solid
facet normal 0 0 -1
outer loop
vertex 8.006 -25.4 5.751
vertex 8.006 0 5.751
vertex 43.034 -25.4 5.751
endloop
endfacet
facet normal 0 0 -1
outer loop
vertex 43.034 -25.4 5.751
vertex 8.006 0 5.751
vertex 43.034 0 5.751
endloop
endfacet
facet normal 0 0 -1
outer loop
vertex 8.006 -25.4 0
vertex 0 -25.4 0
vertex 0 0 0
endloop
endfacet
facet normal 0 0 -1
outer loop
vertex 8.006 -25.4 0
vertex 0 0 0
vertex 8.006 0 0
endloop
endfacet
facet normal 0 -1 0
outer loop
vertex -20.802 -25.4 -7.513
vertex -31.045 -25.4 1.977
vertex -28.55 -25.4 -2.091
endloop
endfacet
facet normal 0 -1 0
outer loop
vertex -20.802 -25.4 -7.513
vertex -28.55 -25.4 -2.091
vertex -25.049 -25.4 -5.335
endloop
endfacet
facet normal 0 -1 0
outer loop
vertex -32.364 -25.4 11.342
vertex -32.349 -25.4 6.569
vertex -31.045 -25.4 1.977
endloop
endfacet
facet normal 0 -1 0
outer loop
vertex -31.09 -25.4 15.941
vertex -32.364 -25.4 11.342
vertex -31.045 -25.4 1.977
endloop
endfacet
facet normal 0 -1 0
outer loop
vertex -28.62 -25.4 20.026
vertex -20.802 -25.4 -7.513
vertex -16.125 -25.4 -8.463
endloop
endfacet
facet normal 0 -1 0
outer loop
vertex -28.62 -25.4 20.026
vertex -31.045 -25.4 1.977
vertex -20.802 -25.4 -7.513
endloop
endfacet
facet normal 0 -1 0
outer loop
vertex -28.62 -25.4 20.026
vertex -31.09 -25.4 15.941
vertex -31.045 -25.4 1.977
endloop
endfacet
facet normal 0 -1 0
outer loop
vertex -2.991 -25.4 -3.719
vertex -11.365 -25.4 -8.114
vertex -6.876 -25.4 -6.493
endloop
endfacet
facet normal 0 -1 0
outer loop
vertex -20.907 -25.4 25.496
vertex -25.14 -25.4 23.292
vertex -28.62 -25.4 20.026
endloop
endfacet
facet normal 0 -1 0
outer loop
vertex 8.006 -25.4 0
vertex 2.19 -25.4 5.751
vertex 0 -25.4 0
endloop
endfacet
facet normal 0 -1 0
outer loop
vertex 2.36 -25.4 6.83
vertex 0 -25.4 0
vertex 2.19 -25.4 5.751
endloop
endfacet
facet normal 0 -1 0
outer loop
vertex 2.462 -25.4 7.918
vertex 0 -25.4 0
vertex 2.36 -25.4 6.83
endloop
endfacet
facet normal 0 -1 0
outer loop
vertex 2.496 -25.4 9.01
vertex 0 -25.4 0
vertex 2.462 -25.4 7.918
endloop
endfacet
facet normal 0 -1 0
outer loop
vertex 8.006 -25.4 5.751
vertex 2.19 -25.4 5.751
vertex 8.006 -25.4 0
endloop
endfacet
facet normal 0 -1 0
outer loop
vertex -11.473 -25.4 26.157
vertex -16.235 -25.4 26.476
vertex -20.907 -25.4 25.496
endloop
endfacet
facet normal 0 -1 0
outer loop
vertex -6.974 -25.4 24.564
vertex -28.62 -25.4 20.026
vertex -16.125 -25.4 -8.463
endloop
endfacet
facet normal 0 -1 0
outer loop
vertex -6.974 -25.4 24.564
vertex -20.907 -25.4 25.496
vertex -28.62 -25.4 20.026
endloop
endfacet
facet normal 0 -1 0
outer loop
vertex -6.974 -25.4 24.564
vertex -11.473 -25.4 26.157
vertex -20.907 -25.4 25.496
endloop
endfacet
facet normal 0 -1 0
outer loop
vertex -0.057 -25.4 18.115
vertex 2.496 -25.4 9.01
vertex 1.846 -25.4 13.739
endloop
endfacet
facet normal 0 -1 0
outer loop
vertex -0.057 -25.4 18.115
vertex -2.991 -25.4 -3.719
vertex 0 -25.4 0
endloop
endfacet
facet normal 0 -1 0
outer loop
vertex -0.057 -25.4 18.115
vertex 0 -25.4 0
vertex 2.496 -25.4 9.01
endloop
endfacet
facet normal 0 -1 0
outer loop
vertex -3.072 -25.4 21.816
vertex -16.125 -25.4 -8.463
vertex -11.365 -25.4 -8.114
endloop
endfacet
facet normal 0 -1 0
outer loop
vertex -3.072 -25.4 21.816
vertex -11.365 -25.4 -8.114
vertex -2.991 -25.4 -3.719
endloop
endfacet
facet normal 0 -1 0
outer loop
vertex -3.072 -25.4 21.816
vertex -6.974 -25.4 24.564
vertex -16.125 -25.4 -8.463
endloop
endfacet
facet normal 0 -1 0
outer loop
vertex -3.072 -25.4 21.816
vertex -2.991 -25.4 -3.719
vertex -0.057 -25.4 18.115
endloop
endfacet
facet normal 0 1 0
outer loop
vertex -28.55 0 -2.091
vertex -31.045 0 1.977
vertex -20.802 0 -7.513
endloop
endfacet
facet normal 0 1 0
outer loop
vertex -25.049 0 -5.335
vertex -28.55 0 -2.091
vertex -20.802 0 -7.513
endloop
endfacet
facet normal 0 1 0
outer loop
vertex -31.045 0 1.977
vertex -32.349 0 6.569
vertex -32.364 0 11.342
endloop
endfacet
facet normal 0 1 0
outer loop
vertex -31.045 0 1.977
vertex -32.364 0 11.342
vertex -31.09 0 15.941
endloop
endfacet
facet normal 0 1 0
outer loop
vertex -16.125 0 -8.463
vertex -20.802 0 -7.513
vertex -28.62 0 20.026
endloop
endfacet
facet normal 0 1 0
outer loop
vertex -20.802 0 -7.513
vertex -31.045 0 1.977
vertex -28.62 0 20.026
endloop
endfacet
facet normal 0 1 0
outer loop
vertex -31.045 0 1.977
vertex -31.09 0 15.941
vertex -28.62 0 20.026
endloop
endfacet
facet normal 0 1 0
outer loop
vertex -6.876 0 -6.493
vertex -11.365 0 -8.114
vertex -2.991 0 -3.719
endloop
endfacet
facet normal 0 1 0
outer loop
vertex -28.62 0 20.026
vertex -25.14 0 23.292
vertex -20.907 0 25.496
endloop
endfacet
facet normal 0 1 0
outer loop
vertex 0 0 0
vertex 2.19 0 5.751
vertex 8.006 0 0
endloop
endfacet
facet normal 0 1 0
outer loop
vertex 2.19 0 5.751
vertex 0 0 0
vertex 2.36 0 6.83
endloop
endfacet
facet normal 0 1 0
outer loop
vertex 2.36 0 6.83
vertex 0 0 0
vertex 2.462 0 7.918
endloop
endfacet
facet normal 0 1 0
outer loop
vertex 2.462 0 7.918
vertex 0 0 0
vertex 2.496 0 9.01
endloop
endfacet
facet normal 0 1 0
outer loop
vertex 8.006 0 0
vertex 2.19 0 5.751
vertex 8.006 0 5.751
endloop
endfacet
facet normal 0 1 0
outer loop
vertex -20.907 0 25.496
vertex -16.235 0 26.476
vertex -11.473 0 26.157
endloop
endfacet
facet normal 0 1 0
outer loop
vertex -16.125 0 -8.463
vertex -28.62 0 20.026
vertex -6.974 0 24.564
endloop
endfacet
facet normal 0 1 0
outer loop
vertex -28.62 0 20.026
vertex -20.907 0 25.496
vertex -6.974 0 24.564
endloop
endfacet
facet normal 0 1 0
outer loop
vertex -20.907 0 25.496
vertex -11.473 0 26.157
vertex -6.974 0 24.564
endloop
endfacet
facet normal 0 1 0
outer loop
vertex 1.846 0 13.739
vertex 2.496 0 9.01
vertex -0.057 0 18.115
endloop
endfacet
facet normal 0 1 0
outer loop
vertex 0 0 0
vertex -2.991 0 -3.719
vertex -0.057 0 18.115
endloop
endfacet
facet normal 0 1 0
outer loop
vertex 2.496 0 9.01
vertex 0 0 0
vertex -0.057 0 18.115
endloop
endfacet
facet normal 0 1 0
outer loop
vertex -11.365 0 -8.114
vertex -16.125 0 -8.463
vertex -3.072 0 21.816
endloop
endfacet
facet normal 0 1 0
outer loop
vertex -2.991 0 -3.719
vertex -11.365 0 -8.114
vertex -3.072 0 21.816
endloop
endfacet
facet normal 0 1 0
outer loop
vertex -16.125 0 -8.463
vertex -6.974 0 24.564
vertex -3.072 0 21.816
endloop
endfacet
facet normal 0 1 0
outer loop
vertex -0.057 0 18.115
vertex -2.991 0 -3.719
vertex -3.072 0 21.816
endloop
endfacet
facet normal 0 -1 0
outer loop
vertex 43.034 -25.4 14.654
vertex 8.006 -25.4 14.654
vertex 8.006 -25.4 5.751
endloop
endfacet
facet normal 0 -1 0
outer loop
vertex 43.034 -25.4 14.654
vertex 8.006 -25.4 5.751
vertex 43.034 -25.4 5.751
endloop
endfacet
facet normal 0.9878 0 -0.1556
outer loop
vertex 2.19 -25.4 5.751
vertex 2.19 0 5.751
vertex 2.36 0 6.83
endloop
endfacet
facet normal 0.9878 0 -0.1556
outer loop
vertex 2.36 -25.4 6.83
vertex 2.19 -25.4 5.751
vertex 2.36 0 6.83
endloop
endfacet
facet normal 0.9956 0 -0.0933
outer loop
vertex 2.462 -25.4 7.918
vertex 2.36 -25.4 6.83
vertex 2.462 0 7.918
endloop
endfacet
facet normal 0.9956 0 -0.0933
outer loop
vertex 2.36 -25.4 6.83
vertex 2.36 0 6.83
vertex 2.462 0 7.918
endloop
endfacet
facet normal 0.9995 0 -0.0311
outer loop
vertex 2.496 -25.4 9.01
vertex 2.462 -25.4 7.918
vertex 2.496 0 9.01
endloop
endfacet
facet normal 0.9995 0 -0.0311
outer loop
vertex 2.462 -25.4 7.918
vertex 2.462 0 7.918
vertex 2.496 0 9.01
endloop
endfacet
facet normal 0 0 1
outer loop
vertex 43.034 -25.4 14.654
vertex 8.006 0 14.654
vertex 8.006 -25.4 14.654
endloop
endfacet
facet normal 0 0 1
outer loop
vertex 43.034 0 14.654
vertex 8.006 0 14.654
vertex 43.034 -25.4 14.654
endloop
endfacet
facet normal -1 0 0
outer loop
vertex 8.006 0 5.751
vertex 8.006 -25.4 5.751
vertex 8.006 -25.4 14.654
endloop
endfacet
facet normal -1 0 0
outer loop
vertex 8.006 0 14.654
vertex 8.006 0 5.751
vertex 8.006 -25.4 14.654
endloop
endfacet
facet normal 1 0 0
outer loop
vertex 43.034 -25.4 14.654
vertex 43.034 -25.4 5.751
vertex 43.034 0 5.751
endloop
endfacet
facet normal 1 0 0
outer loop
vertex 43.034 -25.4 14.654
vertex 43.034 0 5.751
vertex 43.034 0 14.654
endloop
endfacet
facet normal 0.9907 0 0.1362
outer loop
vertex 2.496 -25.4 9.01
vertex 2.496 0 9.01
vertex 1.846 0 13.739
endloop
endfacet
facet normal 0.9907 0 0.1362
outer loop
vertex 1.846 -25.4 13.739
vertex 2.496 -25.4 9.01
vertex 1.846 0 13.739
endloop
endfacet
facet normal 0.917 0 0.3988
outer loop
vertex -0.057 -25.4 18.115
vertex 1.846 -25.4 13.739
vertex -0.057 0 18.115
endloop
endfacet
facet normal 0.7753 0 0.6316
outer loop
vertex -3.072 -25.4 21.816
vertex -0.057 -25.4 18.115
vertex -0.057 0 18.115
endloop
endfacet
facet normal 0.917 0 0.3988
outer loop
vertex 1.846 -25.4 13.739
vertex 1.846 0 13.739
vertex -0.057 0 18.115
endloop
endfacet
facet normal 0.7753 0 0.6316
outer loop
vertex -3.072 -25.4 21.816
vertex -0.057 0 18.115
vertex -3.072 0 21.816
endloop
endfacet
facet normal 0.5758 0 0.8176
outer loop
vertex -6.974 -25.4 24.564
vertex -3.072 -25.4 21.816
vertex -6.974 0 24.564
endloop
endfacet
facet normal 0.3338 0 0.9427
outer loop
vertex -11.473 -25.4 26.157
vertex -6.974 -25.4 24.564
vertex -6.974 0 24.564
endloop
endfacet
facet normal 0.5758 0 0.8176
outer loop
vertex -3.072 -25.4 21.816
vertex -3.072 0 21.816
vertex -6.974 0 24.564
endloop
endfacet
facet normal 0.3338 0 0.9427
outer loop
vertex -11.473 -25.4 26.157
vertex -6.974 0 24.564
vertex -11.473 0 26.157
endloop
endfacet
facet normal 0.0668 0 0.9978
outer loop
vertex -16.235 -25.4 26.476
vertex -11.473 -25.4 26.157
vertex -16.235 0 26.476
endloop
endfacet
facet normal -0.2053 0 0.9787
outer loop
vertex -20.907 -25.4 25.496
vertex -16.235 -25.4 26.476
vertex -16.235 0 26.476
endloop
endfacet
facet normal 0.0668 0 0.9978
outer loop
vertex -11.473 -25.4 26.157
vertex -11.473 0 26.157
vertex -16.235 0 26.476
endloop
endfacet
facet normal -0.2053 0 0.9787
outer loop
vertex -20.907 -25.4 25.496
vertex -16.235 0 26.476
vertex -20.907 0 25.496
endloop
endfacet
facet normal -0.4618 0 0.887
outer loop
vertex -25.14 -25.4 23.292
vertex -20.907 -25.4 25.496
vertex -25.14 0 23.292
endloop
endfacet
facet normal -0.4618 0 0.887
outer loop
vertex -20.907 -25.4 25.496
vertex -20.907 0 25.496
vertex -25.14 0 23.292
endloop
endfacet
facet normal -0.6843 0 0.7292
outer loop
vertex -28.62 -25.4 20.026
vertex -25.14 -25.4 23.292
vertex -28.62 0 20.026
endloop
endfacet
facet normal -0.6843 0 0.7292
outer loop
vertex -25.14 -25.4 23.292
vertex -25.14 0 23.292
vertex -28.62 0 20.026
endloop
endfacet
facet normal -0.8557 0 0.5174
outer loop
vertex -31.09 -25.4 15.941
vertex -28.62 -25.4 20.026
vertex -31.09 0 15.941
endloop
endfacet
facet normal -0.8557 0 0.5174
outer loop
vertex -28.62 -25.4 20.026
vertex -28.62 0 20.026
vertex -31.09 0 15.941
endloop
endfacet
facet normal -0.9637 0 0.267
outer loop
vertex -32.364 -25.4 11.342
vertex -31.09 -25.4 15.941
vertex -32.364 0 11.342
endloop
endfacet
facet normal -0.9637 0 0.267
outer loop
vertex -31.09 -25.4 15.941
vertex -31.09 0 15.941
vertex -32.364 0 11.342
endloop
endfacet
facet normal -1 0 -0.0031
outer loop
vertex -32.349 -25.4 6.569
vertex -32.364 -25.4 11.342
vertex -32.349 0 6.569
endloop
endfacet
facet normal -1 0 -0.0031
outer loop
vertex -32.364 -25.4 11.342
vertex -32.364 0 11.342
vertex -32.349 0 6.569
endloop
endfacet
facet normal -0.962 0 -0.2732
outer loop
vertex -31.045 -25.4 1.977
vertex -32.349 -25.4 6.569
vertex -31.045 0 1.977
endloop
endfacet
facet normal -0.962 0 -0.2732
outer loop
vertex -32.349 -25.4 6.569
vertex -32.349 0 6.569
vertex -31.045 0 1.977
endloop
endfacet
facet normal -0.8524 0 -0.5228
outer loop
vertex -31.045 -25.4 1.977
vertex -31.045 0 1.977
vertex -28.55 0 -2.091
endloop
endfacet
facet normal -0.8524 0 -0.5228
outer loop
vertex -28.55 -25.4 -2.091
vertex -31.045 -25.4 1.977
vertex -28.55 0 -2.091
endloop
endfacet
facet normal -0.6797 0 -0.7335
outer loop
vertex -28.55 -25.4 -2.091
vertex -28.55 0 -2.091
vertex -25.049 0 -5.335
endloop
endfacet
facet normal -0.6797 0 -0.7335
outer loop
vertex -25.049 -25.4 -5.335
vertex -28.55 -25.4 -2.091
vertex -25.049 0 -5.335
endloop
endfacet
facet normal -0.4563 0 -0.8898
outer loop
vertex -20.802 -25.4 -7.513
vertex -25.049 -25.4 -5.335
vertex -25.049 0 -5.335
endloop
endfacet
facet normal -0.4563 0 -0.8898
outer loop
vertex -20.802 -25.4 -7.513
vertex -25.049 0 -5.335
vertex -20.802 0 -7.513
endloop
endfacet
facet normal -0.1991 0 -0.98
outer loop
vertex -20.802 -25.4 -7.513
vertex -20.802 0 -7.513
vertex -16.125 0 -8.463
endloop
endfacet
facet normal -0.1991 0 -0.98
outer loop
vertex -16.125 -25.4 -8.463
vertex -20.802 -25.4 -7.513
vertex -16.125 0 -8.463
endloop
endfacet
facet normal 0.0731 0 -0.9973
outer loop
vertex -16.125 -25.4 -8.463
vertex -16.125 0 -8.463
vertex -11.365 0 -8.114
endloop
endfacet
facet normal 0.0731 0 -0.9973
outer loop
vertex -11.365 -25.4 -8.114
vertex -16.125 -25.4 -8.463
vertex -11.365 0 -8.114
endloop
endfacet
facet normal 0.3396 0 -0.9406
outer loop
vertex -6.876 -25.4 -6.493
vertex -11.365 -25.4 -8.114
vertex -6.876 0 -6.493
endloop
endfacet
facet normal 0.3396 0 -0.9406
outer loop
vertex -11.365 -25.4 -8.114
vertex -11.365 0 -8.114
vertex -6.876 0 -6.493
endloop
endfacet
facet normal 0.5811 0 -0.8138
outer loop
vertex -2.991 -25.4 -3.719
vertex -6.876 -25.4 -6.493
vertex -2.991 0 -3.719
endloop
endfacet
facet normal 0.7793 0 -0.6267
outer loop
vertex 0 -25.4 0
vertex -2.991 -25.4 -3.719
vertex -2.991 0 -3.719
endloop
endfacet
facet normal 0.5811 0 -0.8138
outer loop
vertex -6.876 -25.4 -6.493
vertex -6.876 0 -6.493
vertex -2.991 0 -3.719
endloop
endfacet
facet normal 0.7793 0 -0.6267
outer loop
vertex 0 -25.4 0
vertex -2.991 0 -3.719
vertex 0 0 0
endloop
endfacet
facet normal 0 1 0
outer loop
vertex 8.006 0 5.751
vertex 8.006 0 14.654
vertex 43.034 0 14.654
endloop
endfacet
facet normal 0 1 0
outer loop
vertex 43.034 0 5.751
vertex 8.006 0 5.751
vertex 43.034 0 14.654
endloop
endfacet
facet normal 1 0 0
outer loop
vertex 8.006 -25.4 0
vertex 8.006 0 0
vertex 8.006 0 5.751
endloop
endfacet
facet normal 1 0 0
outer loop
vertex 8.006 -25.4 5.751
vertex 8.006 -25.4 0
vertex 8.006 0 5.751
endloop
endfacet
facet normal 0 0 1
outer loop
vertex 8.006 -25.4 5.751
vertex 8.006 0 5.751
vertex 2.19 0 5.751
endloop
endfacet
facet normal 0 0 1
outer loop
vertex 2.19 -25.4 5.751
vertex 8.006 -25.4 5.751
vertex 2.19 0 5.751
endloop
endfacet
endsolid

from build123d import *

# Parameters (mm, degrees)
F1_DEPTH = 25.4
F0_W     = 35.0273856893
F0_H     = 8.9033269323


with BuildPart() as f1:
    # F0 (on Front) → F1 (new body)
    with BuildSketch(Plane.XZ):
        with BuildLine():
            ThreePointArc((2.1903926758, 5.7508633472), (2.4197734011, 7.3733881804), (2.4964575555, 9.0102516115))
            ThreePointArc((2.4964575555, 9.0102516115), (-31.8842802432, 13.685102797), (0, 0))
            Line((0, 0), (-3.0023471918, 0))
            Line((-3.0023471918, 0), (-3.0023471918, 5.7508633472))
            Line((-3.0023471918, 5.7508633472), (2.1903926758, 5.7508633472))
        make_face()
        with BuildLine():
            ThreePointArc((2.1903926758, 5.7508633472), (1.3498463074, 2.778440423), (0, 0))
            Line((0, 0), (8.0062588677, 0))
            Line((8.0062588677, 0), (8.0062588677, 5.7508633472))
            Line((8.0062588677, 5.7508633472), (2.1903926758, 5.7508633472))
        make_face()
        with BuildLine():
            Line((-3.0023471918, 0), (0, 0))
            ThreePointArc((0, 0), (1.3498463074, 2.778440423), (2.1903926758, 5.7508633472))
            Line((2.1903926758, 5.7508633472), (-3.0023471918, 5.7508633472))
            Line((-3.0023471918, 5.7508633472), (-3.0023471918, 0))
        make_face()
    extrude(amount=F1_DEPTH)


with BuildPart() as f1b:
    # F0 (on Front) → F1, piece 2 (new body)
    with BuildSketch(Plane.XZ):
        with Locations((25.5199517123, 10.2025268134)):
            Rectangle(F0_W, F0_H)
    extrude(amount=F1_DEPTH)


solid = Compound([f1.part, f1b.part])
